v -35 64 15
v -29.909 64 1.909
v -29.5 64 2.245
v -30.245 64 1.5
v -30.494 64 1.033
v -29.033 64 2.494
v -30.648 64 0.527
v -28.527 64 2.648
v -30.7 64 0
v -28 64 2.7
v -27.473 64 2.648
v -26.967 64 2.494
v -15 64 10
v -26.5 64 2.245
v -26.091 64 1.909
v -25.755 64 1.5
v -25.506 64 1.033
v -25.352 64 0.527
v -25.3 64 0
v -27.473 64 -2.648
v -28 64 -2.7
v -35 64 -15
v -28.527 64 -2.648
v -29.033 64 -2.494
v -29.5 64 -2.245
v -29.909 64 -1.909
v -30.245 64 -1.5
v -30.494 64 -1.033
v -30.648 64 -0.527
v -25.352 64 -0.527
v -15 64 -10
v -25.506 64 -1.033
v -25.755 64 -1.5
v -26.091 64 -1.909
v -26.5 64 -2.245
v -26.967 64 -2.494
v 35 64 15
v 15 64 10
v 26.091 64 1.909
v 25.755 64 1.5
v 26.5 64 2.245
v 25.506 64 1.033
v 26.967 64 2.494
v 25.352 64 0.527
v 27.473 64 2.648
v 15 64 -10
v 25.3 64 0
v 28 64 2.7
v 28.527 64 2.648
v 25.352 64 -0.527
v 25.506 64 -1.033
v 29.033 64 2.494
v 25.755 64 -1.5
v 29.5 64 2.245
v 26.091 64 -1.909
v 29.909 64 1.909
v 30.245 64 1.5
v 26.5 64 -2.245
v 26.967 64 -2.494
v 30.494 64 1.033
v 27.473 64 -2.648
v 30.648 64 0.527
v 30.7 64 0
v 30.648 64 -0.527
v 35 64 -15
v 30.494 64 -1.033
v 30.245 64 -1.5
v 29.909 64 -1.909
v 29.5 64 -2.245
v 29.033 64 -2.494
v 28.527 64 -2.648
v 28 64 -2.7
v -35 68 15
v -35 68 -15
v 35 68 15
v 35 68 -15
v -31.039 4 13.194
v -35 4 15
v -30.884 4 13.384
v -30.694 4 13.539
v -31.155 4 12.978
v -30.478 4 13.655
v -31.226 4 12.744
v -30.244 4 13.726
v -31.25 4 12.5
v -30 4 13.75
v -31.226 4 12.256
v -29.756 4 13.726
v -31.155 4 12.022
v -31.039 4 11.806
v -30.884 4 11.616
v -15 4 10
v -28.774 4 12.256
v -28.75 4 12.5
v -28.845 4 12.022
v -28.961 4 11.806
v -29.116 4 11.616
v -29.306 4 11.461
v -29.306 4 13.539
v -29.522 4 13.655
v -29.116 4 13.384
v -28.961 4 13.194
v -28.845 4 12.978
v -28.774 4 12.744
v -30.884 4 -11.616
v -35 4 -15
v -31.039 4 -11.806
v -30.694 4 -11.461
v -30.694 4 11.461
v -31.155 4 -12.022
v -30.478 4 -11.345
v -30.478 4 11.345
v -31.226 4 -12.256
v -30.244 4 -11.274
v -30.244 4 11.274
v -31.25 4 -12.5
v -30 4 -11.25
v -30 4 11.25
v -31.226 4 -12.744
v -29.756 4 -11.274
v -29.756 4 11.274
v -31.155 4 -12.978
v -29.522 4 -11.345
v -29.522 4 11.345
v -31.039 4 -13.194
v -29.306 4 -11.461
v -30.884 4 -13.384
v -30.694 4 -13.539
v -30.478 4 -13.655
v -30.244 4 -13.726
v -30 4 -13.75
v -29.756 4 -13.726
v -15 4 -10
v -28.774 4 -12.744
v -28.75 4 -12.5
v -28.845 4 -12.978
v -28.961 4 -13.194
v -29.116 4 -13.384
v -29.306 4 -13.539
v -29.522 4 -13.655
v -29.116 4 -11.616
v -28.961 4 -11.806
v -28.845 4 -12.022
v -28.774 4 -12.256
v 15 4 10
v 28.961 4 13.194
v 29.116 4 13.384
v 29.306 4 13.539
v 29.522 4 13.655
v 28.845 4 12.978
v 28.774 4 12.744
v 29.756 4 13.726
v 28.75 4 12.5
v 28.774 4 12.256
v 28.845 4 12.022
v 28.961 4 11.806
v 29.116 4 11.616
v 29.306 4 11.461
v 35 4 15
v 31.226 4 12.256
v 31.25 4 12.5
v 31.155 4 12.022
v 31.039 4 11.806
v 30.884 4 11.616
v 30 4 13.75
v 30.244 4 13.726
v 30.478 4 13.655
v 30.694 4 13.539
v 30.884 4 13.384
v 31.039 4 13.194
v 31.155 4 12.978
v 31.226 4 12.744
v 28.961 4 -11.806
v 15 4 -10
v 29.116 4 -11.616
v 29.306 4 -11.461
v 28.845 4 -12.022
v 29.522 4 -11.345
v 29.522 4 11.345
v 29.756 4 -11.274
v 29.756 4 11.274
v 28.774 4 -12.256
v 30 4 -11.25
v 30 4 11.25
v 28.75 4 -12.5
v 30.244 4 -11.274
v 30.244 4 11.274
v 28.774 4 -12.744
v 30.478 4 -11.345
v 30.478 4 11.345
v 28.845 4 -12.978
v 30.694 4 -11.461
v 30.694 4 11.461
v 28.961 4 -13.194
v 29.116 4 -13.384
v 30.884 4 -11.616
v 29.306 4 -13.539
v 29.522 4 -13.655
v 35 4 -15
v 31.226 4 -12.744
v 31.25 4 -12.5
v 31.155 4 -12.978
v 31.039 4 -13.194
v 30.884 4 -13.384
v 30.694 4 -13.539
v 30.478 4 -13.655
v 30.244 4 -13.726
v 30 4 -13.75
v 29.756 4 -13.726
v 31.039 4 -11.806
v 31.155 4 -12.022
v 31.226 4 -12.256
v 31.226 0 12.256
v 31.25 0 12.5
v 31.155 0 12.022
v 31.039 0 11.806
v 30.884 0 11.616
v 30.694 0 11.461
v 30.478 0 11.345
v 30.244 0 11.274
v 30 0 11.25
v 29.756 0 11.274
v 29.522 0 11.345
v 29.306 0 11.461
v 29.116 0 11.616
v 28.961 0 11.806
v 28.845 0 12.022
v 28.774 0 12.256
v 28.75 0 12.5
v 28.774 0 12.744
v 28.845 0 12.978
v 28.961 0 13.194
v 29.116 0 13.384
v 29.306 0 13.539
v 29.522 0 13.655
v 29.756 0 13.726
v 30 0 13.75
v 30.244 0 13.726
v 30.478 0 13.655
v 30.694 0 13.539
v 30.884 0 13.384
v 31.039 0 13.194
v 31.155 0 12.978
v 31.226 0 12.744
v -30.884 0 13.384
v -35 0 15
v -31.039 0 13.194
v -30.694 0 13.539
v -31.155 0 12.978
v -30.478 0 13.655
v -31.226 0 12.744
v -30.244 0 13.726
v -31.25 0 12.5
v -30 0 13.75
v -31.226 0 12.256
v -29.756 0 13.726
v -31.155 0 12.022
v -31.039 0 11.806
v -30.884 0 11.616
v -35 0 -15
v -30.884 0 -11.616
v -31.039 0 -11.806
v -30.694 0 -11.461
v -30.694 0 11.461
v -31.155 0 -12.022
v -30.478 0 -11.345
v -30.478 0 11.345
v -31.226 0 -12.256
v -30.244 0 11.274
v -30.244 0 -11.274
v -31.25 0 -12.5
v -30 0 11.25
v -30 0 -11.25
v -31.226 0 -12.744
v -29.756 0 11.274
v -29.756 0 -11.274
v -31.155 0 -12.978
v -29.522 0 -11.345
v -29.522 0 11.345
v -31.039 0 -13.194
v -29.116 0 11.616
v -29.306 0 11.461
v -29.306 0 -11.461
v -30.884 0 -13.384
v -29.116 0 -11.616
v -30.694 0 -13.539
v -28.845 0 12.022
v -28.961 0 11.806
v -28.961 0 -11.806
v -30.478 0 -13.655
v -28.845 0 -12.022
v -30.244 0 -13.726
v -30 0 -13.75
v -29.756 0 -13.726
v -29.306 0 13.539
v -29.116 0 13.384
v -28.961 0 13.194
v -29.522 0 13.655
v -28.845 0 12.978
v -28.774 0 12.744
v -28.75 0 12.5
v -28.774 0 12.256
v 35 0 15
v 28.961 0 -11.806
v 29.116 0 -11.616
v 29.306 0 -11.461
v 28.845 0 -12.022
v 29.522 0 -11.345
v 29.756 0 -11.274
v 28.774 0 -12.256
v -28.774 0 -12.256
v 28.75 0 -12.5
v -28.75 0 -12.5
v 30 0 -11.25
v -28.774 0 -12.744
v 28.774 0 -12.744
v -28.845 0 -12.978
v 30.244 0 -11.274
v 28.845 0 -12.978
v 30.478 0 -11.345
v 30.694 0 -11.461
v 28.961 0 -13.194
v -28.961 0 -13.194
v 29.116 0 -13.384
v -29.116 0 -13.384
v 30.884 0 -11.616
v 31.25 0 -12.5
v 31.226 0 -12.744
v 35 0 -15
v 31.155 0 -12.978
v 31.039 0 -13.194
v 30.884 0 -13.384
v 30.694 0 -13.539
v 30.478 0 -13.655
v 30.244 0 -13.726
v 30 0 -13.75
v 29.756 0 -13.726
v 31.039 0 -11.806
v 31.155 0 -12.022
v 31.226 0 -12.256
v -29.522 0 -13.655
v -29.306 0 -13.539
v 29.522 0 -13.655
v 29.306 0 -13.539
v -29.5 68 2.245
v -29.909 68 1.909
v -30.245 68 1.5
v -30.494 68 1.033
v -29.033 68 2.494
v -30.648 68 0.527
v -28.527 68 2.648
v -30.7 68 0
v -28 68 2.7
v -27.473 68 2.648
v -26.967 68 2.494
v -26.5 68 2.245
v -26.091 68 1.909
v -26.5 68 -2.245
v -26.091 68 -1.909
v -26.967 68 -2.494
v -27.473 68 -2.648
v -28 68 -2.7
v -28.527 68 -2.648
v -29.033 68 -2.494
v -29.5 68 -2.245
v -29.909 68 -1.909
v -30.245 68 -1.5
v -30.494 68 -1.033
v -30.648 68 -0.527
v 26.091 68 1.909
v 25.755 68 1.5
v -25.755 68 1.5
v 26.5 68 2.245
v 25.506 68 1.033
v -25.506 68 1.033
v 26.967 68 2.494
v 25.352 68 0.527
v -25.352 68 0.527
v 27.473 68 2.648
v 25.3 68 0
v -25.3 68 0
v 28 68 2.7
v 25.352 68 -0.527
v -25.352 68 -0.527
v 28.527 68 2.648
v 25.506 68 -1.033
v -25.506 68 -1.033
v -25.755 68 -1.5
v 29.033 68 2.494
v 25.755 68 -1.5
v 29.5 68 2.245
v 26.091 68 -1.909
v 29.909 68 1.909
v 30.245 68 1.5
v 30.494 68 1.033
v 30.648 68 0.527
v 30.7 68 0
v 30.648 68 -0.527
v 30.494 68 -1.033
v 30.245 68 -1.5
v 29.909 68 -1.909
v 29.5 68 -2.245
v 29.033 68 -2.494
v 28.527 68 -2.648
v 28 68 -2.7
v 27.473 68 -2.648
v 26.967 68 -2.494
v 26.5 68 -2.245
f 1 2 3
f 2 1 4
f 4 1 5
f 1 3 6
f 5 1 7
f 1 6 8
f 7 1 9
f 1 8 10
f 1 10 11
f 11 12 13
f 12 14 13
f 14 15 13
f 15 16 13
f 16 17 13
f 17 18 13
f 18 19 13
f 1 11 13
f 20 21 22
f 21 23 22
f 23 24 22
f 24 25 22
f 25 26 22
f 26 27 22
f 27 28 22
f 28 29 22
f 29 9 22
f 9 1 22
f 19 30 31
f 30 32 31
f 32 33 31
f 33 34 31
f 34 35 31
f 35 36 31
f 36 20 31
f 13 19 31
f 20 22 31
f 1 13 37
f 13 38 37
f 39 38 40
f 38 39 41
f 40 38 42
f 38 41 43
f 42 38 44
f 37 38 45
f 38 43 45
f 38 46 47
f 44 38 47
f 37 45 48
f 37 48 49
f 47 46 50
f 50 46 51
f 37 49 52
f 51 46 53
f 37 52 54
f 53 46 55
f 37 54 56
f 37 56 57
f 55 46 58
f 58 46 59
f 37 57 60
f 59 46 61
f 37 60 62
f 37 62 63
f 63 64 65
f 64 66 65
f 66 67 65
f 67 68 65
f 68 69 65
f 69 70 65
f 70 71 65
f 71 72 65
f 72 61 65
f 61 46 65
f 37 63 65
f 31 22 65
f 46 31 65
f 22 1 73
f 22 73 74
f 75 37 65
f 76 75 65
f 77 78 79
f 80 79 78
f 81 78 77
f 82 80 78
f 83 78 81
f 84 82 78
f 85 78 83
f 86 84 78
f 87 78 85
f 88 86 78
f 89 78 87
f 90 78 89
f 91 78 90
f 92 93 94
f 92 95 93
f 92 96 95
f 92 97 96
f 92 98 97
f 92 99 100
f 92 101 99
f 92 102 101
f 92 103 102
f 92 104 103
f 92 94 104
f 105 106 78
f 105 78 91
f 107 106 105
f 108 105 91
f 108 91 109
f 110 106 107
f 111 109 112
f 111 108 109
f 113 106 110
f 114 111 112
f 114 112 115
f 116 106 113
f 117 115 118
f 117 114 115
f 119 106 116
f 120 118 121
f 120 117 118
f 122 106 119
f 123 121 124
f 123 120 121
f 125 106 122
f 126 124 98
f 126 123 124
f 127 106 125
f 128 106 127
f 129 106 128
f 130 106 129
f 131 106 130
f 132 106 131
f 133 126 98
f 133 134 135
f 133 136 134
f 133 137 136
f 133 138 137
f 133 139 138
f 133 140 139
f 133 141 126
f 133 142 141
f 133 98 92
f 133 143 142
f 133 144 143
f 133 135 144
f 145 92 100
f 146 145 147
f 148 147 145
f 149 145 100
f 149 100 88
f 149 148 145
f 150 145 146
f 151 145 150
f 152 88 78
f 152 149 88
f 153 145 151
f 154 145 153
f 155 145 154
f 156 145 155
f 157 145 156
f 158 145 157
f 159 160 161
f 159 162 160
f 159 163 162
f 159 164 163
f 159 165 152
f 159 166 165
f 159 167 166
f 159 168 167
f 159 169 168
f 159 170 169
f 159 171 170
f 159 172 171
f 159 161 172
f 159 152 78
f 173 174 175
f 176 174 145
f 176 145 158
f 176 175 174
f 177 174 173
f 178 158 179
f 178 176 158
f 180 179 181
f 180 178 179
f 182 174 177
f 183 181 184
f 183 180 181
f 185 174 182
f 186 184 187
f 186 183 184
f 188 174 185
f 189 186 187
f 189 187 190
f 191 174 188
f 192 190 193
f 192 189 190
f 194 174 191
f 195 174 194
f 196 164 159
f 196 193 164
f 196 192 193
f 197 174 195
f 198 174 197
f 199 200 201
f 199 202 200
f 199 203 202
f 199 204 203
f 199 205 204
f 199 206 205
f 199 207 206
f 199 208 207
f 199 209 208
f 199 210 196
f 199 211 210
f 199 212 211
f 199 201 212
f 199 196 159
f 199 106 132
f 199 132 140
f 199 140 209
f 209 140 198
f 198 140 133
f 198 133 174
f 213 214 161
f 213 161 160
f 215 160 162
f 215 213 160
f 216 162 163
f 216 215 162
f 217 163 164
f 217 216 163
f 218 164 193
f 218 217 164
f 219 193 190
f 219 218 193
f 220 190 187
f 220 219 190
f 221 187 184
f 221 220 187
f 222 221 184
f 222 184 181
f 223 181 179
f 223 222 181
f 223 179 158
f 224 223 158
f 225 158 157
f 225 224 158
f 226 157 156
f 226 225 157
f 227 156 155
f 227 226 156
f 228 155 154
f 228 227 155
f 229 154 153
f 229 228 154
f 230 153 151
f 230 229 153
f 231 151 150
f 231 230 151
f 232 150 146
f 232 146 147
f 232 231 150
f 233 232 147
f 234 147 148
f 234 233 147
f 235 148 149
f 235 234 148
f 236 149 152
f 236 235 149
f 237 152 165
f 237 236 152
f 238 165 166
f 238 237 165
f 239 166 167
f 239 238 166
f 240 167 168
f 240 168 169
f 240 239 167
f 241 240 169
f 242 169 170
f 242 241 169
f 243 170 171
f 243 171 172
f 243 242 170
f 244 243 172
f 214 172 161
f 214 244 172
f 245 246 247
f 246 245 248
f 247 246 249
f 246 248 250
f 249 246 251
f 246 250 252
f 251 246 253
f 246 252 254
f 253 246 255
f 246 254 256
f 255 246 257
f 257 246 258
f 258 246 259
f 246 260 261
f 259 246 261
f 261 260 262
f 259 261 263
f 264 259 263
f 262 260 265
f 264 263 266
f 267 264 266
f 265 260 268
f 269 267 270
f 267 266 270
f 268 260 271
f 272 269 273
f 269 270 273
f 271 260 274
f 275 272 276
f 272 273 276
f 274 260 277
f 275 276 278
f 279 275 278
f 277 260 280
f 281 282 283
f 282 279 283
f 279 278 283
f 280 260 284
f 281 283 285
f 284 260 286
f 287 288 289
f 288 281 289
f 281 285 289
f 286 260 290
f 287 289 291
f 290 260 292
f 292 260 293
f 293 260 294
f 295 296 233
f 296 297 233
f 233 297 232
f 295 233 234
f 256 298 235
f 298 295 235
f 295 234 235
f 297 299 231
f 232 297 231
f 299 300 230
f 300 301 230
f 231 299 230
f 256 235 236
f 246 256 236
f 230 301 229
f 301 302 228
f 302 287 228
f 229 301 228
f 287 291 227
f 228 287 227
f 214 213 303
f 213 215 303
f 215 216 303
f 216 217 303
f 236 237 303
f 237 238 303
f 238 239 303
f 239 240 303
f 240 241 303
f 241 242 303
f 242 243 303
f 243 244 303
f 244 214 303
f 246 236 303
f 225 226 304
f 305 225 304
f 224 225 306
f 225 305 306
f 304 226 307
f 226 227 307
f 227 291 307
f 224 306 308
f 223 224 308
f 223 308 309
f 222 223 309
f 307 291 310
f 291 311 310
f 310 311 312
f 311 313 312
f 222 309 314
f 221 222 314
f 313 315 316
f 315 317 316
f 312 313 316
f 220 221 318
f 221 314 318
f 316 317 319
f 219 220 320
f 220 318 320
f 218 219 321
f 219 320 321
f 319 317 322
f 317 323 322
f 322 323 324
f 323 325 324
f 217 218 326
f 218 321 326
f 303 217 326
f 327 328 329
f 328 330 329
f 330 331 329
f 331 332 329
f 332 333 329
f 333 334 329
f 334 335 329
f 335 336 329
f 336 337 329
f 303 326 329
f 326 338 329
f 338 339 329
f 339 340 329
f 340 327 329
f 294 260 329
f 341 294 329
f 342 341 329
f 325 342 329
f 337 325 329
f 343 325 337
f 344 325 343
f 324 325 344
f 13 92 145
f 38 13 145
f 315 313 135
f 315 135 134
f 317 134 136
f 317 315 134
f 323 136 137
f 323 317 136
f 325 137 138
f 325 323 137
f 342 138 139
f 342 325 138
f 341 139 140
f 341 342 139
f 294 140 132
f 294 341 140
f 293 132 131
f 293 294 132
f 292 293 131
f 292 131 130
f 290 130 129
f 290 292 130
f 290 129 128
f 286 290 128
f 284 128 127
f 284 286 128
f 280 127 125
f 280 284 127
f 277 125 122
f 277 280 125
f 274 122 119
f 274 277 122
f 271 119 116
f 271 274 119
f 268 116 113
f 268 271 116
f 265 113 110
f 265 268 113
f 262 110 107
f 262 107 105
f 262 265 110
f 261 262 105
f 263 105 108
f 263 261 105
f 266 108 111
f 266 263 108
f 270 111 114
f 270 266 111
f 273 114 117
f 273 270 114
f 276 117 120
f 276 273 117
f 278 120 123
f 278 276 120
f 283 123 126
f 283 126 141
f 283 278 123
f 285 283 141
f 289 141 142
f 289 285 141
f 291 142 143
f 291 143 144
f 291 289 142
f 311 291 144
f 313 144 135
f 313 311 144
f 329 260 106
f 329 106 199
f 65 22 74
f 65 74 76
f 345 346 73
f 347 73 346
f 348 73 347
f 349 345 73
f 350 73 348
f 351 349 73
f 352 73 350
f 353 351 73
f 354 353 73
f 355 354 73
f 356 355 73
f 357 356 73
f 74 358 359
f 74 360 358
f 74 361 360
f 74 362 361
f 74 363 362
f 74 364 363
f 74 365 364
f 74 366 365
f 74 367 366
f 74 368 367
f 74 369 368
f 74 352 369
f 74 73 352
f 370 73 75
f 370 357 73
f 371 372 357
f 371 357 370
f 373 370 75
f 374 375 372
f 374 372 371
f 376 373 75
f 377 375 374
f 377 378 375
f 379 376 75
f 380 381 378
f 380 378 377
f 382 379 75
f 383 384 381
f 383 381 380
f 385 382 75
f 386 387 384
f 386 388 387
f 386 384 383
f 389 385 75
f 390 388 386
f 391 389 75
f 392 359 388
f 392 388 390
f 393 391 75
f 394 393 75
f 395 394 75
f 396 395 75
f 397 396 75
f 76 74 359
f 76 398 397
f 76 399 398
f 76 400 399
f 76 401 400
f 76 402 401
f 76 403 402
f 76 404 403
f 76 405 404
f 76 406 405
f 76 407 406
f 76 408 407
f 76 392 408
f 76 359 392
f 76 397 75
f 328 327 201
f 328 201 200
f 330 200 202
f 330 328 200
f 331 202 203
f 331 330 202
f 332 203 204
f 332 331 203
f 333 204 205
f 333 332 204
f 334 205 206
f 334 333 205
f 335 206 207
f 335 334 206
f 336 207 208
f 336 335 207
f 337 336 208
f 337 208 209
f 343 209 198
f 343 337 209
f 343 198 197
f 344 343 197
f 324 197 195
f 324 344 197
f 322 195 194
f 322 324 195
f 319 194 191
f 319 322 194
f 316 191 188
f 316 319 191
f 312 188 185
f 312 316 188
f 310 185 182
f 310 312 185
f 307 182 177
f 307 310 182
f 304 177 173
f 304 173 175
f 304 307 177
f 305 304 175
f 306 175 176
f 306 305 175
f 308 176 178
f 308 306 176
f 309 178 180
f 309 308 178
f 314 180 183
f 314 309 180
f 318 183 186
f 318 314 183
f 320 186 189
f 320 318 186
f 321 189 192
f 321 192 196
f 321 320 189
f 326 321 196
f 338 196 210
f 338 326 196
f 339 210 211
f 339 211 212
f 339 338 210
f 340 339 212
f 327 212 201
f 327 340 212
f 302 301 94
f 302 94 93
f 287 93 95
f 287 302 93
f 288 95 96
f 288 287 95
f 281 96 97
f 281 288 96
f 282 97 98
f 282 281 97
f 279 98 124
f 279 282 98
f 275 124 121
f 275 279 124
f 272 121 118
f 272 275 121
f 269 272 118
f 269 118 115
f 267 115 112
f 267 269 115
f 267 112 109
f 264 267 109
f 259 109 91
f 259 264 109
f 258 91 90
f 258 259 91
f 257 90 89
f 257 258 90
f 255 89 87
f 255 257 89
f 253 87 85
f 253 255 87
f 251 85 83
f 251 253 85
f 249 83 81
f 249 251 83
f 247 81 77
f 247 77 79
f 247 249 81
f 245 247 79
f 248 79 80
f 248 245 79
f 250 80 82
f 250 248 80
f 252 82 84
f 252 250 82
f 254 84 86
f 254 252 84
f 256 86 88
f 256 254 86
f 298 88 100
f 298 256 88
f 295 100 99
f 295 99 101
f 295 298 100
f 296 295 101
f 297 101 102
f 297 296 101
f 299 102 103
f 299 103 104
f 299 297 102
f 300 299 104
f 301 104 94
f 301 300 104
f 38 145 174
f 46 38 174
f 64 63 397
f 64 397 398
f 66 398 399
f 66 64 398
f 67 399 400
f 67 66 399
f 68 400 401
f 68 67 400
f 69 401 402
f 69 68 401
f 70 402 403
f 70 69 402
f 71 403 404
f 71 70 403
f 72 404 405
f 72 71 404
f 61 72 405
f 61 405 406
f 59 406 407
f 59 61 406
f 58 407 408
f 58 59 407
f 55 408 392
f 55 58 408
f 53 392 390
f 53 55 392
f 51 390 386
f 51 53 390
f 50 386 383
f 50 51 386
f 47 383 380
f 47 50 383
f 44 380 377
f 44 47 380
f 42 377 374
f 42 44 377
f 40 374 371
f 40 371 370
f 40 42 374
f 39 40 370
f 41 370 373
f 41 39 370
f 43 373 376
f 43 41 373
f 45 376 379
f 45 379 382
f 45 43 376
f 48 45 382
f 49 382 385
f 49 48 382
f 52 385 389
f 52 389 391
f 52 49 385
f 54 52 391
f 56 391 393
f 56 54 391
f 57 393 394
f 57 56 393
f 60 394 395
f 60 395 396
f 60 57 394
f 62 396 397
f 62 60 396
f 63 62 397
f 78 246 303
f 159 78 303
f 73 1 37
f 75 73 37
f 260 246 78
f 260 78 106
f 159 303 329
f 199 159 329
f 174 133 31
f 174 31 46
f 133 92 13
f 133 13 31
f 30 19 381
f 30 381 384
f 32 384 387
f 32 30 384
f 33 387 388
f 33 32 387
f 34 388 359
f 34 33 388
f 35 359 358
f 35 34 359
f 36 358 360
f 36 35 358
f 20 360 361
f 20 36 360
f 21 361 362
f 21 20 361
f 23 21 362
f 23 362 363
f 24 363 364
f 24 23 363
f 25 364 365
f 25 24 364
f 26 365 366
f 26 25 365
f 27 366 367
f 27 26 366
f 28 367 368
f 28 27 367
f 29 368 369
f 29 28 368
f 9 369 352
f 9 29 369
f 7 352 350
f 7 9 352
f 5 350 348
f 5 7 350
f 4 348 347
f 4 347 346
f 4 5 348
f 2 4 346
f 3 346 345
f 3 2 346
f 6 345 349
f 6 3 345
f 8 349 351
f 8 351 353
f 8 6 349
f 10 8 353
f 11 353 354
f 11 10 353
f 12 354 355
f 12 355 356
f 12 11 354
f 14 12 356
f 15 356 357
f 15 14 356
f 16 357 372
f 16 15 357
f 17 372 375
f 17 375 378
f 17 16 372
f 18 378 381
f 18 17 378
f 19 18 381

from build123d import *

# Parameters (mm, degrees)
SKETCH2_W           = 70
SKETCH2_H           = 30
SKETCH2_R           = 1.25
BOSS_EXTRUDE1_DEPTH = 4
SKETCH4_W           = 30
SKETCH4_H           = 20
BOSS_EXTRUDE2_DEPTH = 60.0001011
SKETCH5_W           = 70
SKETCH5_H           = 30
SKETCH5_R           = 2.7
BOSS_EXTRUDE3_DEPTH = 4


with BuildPart() as part:
    # Sketch2 → Boss-Extrude1 (new body)
    with BuildSketch(Plane(origin=(0, 0, 0), x_dir=(1, 0, 0), z_dir=(0, 1, 0))):
        Rectangle(SKETCH2_W, SKETCH2_H)
        with Locations((-30, -12.5)):
            Circle(SKETCH2_R, mode=Mode.SUBTRACT)
        with Locations((-30, 12.5)):
            Circle(SKETCH2_R, mode=Mode.SUBTRACT)
        with Locations((30, -12.5)):
            Circle(SKETCH2_R, mode=Mode.SUBTRACT)
        with Locations((30, 12.5)):
            Circle(SKETCH2_R, mode=Mode.SUBTRACT)
    extrude(amount=BOSS_EXTRUDE1_DEPTH)

    # Sketch4 → Boss-Extrude2 (add)
    with BuildSketch(Plane(origin=(0, 4, 0), x_dir=(1, 0, 0), z_dir=(0, 1, 0))):
        Rectangle(SKETCH4_W, SKETCH4_H)
    extrude(amount=BOSS_EXTRUDE2_DEPTH)

    # Sketch5 → Boss-Extrude3 (add)
    with BuildSketch(Plane(origin=(0, 64.0001011, 0), x_dir=(1, 0, 0), z_dir=(0, 1, 0))):
        Rectangle(SKETCH5_W, SKETCH5_H)
        with Locations((-28, 0)):
            Circle(SKETCH5_R, mode=Mode.SUBTRACT)
        with Locations((28, 0)):
            Circle(SKETCH5_R, mode=Mode.SUBTRACT)
    extrude(amount=BOSS_EXTRUDE3_DEPTH)


solid = part.part
